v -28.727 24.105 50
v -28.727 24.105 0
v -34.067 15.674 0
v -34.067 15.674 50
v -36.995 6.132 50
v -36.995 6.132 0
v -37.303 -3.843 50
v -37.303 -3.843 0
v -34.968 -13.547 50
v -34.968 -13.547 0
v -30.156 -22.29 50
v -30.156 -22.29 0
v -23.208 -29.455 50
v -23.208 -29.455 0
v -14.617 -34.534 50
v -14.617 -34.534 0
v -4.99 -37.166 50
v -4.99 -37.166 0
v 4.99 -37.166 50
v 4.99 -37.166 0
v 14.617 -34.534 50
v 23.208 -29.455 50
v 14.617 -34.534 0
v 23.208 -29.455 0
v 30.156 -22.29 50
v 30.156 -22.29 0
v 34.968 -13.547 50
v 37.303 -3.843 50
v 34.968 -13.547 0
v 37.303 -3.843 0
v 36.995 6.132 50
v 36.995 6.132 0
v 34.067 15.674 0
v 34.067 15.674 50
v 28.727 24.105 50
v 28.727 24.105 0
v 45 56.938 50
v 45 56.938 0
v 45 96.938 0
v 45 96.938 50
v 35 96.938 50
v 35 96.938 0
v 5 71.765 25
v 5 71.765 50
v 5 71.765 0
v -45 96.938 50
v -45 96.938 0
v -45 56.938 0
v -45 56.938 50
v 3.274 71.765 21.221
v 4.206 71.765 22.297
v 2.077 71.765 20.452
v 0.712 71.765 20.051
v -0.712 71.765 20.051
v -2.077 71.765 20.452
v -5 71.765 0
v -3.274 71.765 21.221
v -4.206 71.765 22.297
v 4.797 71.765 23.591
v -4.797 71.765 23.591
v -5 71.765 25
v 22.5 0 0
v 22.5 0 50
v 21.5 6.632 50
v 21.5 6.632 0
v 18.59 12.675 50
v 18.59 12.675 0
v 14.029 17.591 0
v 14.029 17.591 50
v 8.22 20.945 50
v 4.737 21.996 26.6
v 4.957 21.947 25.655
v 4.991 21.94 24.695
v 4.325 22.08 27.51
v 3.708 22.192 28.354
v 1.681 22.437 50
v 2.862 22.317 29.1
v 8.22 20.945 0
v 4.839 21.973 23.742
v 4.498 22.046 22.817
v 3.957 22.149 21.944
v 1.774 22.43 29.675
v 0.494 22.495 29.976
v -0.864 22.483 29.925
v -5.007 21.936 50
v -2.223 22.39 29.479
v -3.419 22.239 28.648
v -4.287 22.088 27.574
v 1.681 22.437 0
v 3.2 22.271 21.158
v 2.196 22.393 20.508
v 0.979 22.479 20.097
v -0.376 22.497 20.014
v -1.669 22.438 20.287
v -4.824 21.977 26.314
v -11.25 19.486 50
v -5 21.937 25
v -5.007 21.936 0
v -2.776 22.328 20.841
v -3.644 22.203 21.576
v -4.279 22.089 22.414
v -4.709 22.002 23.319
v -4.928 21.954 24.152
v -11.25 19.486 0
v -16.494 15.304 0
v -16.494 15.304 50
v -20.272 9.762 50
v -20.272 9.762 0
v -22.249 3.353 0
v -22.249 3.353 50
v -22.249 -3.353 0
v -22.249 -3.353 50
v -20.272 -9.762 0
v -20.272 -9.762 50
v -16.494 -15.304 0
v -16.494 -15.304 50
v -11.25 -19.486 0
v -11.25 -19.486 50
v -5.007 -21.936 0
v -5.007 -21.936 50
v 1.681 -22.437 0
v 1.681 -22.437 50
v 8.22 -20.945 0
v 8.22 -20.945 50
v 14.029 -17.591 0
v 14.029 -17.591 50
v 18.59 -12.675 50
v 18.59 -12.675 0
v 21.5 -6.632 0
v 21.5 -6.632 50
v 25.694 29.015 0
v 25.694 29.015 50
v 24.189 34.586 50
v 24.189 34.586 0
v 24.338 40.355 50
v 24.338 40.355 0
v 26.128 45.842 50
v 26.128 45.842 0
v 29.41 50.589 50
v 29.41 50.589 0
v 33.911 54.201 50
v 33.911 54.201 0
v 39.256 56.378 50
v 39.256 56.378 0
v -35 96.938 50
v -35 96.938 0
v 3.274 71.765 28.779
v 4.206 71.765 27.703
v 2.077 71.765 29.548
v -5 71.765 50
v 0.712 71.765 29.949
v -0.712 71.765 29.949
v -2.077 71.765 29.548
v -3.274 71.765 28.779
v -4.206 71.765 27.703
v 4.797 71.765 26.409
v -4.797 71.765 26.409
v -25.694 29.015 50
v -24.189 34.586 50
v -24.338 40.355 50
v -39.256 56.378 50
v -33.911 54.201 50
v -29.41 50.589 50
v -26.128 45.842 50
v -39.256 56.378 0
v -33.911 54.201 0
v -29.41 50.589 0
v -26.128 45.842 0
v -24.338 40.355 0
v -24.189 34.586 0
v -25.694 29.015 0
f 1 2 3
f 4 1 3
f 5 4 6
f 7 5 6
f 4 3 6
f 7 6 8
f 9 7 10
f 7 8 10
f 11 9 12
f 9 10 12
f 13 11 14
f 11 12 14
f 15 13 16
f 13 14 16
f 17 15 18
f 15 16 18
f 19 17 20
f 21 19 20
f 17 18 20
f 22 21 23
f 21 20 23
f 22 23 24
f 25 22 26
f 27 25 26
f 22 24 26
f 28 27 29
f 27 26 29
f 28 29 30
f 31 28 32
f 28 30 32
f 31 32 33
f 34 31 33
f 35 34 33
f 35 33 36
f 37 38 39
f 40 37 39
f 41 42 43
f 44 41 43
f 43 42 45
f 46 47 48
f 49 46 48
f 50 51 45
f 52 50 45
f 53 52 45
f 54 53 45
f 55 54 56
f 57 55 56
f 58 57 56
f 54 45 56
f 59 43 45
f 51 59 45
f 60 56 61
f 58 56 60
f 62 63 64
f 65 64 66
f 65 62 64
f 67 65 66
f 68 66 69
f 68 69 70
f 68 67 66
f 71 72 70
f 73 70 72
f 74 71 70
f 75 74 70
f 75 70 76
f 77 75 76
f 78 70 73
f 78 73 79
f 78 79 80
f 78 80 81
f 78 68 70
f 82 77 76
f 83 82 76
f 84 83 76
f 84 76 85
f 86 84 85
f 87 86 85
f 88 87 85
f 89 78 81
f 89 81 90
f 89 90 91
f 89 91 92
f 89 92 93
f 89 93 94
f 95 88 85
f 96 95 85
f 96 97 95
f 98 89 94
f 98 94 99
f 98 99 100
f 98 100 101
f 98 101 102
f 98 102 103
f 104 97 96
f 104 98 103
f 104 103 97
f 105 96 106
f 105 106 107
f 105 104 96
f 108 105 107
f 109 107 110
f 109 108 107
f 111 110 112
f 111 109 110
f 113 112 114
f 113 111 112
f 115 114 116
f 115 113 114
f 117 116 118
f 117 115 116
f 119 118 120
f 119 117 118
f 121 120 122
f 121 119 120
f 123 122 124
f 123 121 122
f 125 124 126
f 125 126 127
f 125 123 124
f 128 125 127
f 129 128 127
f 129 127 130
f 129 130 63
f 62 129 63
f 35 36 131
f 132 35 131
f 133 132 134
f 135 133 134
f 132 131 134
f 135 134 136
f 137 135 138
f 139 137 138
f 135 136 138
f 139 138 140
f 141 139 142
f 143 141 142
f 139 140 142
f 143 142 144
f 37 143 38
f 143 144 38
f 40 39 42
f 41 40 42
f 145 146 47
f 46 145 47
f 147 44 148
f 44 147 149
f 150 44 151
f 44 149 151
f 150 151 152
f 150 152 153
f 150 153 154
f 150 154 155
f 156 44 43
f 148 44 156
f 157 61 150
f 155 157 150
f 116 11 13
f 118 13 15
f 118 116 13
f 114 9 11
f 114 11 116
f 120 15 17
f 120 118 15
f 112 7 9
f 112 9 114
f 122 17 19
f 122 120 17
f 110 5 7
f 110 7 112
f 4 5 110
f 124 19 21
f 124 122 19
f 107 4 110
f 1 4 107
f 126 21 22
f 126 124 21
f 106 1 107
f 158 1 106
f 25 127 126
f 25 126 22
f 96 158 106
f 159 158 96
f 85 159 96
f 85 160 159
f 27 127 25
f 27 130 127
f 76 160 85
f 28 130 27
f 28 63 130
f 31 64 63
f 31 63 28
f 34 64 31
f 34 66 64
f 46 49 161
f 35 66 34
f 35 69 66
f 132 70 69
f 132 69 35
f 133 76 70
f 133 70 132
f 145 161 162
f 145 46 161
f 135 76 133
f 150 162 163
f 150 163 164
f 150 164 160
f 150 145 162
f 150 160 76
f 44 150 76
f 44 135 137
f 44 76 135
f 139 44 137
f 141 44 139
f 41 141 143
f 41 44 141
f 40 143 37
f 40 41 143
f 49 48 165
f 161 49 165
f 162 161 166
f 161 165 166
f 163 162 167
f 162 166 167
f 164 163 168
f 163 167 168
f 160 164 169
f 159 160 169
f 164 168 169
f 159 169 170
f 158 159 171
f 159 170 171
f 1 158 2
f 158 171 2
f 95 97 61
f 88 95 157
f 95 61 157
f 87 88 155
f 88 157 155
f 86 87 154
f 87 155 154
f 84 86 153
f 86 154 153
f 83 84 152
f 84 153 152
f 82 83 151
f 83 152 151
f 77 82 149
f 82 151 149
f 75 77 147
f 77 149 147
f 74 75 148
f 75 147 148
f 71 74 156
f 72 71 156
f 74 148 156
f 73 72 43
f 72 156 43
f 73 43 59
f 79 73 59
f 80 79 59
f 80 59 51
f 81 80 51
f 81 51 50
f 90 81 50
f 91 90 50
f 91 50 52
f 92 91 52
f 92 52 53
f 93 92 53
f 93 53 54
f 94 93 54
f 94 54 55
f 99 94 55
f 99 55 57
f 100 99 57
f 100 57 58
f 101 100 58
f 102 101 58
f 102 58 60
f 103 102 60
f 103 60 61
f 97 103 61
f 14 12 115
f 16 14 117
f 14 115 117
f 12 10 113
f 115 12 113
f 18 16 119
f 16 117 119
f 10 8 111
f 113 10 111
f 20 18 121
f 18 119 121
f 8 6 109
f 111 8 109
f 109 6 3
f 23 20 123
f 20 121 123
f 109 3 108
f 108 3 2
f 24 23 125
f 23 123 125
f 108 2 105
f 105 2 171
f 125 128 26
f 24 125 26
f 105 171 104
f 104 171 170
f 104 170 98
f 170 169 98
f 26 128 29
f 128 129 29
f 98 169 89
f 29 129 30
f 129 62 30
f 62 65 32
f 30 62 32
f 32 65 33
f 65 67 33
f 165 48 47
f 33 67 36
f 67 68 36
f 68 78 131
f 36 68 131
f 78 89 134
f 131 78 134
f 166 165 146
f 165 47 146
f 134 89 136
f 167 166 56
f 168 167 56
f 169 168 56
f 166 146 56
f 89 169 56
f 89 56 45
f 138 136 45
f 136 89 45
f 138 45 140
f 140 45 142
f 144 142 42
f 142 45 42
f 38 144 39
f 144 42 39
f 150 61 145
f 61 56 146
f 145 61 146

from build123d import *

# Parameters (mm, degrees)
SKETCH1_R               = 22.5
BOSS_EXTRUDE1_DEPTH     = 50
CUT_EXTRUDE1_REACH      = 130.311
CUT_EXTRUDE1_END_RADIUS = 22.5
SKETCH2_R               = 5


with BuildPart() as part:
    # Sketch1 → Boss-Extrude1 (new body)
    with BuildSketch(Plane.XY):
        with BuildLine():
            Line((45, 56.93759592), (45, 96.93759592))
            Line((45, 96.93759592), (35, 96.93759592))
            Line((35, 96.93759592), (5, 71.764606985))
            Line((5, 71.764606985), (-5, 71.764606985))
            Line((-5, 71.764606985), (-35, 96.93759592))
            Line((-35, 96.93759592), (-45, 96.93759592))
            Line((-45, 96.93759592), (-45, 56.93759592))
            ThreePointArc((-45, 56.93759592), (-26.127859204, 45.841981394), (-28.726666617, 24.104535363))
            ThreePointArc((-28.726666617, 24.104535363), (0, -37.5), (28.726666617, 24.104535363))
            ThreePointArc((28.726666617, 24.104535363), (26.127859204, 45.841981394), (45, 56.93759592))
        make_face()
        Circle(SKETCH1_R, mode=Mode.SUBTRACT)
    extrude(amount=BOSS_EXTRUDE1_DEPTH)

    # Cut-Extrude1: up to this cylinder (the profile starts outside it)
    cut_extrude1_end = Plane(origin=(0, 0, 25), z_dir=(0, 0, -1)) * Cylinder(CUT_EXTRUDE1_END_RADIUS, 306.622, mode=Mode.PRIVATE)
    # Sketch2 → Cut-Extrude1 (cut, up to the surface)
    with BuildSketch(Plane(origin=(0, 71.764606985, 0), x_dir=(1, 0, 0), z_dir=(0, 1, 0)), mode=Mode.PRIVATE) as cut_extrude1_sk1:
        with Locations(Location((0, -25, 0), (0, 0, 180))):
            Circle(SKETCH2_R)
    cut_extrude1_tool1 = extrude(cut_extrude1_sk1.sketch, amount=-CUT_EXTRUDE1_REACH, mode=Mode.PRIVATE) - cut_extrude1_end
    add(cut_extrude1_tool1.solids().sort_by_distance((0, 71.764607, 25))[0], mode=Mode.SUBTRACT)


solid = part.part
